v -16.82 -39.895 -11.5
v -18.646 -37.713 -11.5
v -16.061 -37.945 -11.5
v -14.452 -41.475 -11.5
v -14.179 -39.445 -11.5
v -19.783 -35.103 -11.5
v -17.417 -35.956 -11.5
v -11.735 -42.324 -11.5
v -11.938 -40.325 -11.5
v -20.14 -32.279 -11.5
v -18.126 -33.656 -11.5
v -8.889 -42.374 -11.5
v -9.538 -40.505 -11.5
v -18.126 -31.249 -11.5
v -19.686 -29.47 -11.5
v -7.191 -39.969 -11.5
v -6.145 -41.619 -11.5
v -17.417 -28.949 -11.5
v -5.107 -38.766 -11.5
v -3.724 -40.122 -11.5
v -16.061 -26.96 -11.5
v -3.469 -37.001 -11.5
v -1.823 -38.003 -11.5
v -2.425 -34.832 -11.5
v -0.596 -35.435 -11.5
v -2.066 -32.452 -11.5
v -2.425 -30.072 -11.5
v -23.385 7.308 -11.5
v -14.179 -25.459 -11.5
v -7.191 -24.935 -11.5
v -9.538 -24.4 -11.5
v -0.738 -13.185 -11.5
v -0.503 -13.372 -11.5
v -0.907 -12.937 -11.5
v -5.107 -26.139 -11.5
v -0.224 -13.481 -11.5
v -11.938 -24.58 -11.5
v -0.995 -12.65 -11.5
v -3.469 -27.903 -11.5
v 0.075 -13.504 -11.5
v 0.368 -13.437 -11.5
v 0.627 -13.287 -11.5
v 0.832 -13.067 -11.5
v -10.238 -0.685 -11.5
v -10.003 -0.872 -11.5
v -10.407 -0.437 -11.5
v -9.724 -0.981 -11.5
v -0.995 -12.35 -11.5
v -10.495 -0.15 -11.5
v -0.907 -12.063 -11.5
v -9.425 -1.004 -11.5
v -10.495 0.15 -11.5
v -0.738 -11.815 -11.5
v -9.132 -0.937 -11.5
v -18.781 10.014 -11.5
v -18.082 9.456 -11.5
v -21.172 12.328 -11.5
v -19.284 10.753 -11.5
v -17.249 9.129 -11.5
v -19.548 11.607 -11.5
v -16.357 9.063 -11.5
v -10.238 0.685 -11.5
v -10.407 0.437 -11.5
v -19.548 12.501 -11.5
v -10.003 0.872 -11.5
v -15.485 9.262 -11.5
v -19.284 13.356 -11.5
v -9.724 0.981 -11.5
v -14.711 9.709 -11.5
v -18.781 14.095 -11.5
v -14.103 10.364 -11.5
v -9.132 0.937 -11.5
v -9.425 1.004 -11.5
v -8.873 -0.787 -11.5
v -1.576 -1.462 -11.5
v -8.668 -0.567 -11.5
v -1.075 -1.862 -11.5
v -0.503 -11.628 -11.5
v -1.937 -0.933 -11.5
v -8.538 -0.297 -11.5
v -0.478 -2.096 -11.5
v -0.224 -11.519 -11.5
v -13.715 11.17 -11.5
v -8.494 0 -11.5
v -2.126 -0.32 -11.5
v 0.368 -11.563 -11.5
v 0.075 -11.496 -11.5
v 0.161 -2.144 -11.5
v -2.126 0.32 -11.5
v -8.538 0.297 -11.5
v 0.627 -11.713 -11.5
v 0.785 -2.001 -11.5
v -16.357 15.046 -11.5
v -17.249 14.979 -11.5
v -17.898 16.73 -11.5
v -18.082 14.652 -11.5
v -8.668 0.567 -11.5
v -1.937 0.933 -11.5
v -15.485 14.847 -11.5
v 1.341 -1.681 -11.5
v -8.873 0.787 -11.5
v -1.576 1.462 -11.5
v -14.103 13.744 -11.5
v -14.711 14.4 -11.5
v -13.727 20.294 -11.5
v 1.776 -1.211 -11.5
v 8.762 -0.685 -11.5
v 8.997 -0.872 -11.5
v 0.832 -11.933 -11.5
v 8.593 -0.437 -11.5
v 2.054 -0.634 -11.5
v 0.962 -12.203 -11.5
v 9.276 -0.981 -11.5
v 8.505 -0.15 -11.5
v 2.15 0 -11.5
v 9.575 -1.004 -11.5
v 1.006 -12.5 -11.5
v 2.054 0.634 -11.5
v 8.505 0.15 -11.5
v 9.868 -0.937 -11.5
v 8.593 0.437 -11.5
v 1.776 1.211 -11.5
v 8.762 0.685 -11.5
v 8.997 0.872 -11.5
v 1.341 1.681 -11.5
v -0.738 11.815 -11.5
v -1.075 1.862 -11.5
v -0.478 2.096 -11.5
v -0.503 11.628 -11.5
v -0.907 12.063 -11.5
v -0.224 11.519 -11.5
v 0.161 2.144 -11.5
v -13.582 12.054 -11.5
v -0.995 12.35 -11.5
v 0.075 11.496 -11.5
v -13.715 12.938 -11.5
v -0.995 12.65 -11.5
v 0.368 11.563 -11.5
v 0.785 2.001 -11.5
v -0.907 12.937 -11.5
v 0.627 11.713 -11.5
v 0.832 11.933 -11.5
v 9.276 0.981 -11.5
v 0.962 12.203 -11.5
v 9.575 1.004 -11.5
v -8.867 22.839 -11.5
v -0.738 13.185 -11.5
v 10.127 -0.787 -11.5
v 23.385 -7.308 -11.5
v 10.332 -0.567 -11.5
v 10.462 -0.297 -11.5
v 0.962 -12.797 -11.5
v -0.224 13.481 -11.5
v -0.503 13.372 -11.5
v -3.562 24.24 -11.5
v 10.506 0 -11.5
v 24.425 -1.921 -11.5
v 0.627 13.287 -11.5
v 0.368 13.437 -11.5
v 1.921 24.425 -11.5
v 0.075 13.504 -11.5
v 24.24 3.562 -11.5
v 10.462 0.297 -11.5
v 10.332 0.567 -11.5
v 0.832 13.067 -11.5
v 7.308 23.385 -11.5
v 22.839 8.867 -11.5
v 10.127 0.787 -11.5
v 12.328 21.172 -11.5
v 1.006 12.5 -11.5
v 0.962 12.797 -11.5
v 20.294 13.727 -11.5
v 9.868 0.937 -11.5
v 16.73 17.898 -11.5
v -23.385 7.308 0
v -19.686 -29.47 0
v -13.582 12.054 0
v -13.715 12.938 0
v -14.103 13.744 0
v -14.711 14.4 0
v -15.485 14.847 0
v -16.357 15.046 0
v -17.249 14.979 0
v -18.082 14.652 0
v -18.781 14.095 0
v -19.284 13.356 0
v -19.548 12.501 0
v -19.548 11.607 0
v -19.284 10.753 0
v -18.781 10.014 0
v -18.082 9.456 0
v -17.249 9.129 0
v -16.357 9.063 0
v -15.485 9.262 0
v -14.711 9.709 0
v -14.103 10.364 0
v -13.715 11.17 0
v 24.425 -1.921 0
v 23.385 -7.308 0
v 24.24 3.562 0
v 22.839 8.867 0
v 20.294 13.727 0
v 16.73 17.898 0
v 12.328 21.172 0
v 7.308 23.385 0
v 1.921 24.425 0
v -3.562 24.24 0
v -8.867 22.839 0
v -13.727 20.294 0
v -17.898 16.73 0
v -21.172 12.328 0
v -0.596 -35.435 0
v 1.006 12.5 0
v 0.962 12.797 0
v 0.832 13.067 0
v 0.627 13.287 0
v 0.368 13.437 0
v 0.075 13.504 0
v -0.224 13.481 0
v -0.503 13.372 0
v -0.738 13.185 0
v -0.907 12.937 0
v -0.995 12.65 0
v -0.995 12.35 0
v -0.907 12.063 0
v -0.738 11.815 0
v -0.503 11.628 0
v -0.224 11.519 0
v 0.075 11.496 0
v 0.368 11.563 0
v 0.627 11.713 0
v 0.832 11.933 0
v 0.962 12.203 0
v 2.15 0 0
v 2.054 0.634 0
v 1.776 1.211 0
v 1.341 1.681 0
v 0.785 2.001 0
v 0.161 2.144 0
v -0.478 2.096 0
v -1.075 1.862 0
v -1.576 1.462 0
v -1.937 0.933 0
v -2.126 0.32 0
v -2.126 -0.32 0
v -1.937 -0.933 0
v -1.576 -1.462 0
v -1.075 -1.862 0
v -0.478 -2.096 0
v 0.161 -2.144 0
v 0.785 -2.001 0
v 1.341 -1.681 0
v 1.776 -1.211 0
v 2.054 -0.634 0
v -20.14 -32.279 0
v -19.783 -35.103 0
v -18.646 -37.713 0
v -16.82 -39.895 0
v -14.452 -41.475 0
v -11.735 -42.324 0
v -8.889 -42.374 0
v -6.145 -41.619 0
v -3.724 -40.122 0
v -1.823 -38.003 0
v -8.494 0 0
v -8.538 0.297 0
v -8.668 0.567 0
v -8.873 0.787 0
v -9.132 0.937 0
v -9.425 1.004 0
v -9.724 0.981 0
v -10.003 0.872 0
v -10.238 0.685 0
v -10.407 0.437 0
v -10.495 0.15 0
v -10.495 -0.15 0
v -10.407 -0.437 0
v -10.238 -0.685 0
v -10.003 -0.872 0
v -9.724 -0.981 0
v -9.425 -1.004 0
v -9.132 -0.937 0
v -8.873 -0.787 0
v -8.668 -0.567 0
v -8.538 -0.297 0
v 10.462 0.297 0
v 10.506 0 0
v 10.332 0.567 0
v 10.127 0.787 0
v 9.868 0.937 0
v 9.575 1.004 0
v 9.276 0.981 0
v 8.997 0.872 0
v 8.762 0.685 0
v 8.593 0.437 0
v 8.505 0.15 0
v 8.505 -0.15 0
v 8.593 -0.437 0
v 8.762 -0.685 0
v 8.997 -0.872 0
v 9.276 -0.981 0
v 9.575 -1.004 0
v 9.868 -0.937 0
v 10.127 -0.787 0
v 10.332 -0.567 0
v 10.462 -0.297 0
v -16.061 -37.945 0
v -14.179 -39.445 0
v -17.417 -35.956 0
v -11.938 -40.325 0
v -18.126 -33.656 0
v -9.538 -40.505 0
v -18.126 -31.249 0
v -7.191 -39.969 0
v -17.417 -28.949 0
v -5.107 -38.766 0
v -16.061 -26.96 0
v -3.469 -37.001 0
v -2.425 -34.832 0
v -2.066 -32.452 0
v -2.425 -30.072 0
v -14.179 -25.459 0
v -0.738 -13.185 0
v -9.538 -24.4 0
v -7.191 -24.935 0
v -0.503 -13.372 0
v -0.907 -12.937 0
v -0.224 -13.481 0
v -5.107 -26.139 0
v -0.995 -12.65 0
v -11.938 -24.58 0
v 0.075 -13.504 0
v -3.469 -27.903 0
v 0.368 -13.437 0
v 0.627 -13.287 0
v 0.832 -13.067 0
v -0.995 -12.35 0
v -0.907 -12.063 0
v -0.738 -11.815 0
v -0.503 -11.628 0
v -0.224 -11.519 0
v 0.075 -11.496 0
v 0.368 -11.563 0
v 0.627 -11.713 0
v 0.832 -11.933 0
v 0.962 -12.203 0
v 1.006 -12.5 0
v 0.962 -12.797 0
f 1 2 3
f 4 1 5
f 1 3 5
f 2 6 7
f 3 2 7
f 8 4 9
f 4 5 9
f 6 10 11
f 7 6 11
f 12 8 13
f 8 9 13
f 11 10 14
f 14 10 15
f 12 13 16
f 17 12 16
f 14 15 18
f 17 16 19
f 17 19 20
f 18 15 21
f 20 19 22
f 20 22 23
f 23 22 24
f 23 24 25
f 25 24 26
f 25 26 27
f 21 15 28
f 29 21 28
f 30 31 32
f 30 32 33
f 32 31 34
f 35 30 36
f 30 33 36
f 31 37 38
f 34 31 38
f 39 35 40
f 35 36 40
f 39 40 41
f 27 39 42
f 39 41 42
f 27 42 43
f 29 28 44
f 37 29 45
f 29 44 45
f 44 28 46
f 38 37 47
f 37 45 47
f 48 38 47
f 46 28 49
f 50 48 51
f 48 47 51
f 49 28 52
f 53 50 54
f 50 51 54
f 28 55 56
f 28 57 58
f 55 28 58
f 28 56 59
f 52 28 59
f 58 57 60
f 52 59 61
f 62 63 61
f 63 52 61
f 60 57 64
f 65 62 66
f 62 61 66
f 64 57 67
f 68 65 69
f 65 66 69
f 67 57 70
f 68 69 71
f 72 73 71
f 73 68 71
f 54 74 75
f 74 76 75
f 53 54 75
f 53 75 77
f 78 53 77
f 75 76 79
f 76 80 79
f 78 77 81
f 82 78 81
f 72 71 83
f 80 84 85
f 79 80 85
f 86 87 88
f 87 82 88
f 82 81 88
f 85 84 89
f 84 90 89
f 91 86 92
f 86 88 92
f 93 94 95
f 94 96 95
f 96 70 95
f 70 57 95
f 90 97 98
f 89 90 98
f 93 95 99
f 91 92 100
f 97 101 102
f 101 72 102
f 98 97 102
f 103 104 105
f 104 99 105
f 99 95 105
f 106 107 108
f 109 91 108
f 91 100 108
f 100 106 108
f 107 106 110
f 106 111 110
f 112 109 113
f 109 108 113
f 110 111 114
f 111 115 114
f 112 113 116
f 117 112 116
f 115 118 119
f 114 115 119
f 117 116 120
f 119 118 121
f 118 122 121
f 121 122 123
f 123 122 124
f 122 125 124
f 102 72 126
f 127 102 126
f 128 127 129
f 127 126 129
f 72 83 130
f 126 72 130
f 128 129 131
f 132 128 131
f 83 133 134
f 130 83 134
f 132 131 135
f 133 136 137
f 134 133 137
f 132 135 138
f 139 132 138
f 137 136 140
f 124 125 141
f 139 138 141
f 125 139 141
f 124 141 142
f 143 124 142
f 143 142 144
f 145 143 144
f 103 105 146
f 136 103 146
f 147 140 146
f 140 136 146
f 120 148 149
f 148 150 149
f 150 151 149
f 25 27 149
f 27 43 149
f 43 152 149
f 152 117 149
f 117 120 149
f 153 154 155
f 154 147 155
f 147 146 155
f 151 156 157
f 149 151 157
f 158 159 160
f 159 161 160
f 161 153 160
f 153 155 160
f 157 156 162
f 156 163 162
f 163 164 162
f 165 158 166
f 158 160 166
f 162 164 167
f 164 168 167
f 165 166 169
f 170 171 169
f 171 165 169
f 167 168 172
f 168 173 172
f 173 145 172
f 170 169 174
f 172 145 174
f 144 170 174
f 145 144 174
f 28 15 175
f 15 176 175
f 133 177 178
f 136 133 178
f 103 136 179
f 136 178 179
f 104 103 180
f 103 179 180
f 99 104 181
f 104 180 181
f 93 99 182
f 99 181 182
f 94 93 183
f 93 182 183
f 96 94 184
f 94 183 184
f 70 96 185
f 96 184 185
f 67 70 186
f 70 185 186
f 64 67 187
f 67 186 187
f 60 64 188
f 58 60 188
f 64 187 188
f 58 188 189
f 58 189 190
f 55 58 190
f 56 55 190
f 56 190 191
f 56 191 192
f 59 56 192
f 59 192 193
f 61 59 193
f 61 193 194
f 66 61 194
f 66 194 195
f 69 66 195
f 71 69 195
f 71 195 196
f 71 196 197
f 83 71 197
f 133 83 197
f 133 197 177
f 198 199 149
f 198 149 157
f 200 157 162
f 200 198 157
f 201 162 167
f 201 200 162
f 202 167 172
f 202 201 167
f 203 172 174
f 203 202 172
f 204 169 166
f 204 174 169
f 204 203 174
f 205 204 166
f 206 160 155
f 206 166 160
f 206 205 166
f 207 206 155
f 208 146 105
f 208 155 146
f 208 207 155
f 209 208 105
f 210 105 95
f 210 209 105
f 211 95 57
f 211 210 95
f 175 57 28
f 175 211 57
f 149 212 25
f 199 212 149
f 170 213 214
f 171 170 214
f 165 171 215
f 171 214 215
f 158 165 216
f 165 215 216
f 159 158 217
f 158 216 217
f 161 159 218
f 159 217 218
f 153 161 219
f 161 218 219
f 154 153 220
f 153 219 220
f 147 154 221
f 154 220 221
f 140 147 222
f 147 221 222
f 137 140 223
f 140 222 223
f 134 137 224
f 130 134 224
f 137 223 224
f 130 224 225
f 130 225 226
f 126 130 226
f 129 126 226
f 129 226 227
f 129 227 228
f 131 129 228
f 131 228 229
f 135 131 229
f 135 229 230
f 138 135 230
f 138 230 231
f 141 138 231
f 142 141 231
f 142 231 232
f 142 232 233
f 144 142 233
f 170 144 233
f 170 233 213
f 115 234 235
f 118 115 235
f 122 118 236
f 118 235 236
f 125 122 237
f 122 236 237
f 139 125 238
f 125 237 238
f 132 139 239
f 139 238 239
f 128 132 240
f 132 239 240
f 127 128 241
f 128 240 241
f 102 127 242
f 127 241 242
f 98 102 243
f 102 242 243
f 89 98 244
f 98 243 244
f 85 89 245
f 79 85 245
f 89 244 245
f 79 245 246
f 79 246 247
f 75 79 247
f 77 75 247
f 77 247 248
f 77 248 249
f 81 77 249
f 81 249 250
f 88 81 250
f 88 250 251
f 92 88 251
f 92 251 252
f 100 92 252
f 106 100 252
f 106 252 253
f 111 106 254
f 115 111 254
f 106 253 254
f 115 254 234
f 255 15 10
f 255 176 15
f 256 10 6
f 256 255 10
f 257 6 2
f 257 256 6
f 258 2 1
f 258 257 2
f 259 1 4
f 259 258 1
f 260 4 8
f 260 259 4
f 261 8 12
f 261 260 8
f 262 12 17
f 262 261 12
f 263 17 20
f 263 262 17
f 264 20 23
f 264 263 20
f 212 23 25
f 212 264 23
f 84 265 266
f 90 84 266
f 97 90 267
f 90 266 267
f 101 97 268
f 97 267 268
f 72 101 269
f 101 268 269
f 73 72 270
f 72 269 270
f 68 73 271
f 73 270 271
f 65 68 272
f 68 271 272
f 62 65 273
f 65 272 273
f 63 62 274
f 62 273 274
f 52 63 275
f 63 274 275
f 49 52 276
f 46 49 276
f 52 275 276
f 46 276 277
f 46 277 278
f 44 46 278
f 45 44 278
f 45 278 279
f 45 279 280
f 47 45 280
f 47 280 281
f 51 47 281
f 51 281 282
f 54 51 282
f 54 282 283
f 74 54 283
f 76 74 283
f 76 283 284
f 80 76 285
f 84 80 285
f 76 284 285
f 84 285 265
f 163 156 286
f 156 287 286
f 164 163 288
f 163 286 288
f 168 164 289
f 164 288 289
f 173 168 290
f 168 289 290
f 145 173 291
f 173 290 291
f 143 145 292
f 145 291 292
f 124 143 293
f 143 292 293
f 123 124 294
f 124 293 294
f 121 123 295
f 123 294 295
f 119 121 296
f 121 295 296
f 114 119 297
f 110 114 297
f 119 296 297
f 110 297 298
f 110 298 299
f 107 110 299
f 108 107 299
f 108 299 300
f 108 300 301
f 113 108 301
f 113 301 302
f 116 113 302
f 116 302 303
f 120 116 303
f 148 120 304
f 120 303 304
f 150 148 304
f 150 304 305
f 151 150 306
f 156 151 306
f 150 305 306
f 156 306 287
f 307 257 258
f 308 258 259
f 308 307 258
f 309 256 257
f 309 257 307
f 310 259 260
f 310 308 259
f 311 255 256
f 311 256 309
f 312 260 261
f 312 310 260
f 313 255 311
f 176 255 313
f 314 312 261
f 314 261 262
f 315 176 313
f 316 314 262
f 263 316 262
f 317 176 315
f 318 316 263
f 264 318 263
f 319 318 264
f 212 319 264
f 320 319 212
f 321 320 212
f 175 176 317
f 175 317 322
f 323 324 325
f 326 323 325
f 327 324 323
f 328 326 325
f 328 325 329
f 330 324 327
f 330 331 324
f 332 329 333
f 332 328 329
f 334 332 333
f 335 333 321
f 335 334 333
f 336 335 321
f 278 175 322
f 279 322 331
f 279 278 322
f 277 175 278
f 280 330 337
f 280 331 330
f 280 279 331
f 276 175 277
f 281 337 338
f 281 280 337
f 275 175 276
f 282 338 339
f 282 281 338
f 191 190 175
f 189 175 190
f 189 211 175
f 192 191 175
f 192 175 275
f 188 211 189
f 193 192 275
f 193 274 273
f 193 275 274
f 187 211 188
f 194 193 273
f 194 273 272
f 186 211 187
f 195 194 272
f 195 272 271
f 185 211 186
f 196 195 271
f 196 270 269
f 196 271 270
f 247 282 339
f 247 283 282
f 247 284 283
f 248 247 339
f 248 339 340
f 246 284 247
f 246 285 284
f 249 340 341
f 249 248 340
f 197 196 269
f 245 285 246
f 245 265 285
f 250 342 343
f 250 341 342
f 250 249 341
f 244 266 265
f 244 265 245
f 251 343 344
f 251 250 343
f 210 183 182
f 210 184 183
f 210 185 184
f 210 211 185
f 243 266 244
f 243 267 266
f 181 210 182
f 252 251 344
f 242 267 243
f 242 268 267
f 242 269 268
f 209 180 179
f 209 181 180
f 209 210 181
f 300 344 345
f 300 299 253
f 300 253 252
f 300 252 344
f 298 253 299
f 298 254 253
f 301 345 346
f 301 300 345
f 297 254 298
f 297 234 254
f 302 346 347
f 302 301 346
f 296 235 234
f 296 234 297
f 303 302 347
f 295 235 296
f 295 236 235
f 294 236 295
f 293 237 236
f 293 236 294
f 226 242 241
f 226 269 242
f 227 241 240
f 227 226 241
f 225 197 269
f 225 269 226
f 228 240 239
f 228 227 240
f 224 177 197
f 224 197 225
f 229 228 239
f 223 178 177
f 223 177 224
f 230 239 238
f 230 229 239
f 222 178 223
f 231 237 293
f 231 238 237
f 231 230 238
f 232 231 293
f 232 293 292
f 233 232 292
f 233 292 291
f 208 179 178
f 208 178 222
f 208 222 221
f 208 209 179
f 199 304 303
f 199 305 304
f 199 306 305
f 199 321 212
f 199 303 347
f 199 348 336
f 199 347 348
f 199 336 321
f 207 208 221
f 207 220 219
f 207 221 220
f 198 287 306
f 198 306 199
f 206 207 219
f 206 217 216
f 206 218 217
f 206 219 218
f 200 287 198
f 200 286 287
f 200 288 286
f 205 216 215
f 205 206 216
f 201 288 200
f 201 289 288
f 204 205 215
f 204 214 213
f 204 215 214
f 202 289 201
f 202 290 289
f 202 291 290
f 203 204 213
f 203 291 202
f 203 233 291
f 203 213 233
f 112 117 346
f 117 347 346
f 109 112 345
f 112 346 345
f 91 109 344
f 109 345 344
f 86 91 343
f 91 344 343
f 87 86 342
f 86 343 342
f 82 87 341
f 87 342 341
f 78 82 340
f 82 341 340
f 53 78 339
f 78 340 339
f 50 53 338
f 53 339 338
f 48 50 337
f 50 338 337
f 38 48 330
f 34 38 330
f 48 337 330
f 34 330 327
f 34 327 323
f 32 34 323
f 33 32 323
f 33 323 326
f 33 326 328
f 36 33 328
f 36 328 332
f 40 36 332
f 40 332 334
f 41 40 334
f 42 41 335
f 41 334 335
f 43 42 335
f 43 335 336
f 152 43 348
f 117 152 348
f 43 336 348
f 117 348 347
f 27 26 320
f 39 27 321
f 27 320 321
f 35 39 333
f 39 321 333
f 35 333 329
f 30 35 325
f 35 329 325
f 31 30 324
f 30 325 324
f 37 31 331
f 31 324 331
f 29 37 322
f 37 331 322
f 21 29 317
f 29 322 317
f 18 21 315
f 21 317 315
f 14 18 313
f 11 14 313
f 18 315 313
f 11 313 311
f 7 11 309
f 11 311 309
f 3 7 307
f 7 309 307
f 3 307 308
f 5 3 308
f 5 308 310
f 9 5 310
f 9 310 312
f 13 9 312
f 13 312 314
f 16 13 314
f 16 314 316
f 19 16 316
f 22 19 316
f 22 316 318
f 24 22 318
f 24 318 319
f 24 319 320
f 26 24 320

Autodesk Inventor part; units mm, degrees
ref_plane "YZ Plane" through (0, 0, 0) normal (1, 0, 0) x (0, 1, 0)
ref_plane "XZ Plane" through (0, 0, 0) normal (0, 1, 0) x (-1, 0, 0)
ref_plane "XY Plane" through (0, 0, 0) normal (0, 0, 1) x (1, 0, 0)
ref_plane "РабПлоскость1" through (0, 0, 0) normal (0, 0, 1) x (1, 0, 0)
sketch "Эскиз1" plane through (0, 0, 0) normal (0, 0, 1) x (1, 0, 0)
  circle A0 centre (0, 0) radius 15 projected
  circle A1 centre (-9.5, 0) radius 1.0064 projected
  circle A2 centre (0, -12.5) radius 1.0064 projected
  circle A3 centre (0, 12.5) radius 1.0064 projected
  circle A4 centre (9.5, 0) radius 1.0064 projected
  circle A5 centre (0, 0) radius 2 projected
  circle A6 centre (0, 0) radius 2.15
  circle A7 centre (-16.5815, 12.0542) radius 3
  circle A8 centre (-10.1413, -32.4523) radius 8.075
  circle A9 centre (-19.85, 6.2031) radius 2.5 construction
  circle A10 centre (-5, -16) radius 2.5 construction
  circle A11 centre (19.85, -6.2031) radius 2.5 construction
  line L0 (19.85, -6.2031) -> (-19.85, 6.2031) construction
  line L1 (-10.1413, -32.4523) -> (-5, -16) construction
  circle A12 centre (-10.1413, -32.4523) radius 4 construction
  circle A13 centre (-10.1413, -32.4523) radius 12.5 construction
  circle A14 centre (-10.1413, -32.4523) radius 10
  line L2 (-0.5965, -35.4351) -> (-19.6861, -29.4696) construction
  circle A15 centre (0, 0) radius 24.5
  circle A16 centre (-16.5815, 12.0542) radius 4 construction
  line L3 (-0.5965, -35.4351) -> (23.3848, -7.3077)
  line L4 (-19.6861, -29.4696) -> (-23.3848, 7.3077)
  point P0 (-19.6861, -29.4696)
  dimension "d9" = 20
  dimension "d0" = 4.3
  dimension "d1" = 6
  dimension "d2" = 16.15
  dimension "d3" = 5
  dimension "d4" = 5
  dimension "d5" = 5
  dimension "d6" = 8
  dimension "d7" = 25
  dimension "d8" = 34
  dimension "d10" = 8
  dimension "d11" = 49
extrude "Выдавливание1" add sketch "Эскиз1" against normal blind 11.5 contours A0 | A14 A15 | L4 A15 A14 | A14 A15 L3 | A15 L4 L3 A14 | A14 A15
properties part number "DriblerWall"
